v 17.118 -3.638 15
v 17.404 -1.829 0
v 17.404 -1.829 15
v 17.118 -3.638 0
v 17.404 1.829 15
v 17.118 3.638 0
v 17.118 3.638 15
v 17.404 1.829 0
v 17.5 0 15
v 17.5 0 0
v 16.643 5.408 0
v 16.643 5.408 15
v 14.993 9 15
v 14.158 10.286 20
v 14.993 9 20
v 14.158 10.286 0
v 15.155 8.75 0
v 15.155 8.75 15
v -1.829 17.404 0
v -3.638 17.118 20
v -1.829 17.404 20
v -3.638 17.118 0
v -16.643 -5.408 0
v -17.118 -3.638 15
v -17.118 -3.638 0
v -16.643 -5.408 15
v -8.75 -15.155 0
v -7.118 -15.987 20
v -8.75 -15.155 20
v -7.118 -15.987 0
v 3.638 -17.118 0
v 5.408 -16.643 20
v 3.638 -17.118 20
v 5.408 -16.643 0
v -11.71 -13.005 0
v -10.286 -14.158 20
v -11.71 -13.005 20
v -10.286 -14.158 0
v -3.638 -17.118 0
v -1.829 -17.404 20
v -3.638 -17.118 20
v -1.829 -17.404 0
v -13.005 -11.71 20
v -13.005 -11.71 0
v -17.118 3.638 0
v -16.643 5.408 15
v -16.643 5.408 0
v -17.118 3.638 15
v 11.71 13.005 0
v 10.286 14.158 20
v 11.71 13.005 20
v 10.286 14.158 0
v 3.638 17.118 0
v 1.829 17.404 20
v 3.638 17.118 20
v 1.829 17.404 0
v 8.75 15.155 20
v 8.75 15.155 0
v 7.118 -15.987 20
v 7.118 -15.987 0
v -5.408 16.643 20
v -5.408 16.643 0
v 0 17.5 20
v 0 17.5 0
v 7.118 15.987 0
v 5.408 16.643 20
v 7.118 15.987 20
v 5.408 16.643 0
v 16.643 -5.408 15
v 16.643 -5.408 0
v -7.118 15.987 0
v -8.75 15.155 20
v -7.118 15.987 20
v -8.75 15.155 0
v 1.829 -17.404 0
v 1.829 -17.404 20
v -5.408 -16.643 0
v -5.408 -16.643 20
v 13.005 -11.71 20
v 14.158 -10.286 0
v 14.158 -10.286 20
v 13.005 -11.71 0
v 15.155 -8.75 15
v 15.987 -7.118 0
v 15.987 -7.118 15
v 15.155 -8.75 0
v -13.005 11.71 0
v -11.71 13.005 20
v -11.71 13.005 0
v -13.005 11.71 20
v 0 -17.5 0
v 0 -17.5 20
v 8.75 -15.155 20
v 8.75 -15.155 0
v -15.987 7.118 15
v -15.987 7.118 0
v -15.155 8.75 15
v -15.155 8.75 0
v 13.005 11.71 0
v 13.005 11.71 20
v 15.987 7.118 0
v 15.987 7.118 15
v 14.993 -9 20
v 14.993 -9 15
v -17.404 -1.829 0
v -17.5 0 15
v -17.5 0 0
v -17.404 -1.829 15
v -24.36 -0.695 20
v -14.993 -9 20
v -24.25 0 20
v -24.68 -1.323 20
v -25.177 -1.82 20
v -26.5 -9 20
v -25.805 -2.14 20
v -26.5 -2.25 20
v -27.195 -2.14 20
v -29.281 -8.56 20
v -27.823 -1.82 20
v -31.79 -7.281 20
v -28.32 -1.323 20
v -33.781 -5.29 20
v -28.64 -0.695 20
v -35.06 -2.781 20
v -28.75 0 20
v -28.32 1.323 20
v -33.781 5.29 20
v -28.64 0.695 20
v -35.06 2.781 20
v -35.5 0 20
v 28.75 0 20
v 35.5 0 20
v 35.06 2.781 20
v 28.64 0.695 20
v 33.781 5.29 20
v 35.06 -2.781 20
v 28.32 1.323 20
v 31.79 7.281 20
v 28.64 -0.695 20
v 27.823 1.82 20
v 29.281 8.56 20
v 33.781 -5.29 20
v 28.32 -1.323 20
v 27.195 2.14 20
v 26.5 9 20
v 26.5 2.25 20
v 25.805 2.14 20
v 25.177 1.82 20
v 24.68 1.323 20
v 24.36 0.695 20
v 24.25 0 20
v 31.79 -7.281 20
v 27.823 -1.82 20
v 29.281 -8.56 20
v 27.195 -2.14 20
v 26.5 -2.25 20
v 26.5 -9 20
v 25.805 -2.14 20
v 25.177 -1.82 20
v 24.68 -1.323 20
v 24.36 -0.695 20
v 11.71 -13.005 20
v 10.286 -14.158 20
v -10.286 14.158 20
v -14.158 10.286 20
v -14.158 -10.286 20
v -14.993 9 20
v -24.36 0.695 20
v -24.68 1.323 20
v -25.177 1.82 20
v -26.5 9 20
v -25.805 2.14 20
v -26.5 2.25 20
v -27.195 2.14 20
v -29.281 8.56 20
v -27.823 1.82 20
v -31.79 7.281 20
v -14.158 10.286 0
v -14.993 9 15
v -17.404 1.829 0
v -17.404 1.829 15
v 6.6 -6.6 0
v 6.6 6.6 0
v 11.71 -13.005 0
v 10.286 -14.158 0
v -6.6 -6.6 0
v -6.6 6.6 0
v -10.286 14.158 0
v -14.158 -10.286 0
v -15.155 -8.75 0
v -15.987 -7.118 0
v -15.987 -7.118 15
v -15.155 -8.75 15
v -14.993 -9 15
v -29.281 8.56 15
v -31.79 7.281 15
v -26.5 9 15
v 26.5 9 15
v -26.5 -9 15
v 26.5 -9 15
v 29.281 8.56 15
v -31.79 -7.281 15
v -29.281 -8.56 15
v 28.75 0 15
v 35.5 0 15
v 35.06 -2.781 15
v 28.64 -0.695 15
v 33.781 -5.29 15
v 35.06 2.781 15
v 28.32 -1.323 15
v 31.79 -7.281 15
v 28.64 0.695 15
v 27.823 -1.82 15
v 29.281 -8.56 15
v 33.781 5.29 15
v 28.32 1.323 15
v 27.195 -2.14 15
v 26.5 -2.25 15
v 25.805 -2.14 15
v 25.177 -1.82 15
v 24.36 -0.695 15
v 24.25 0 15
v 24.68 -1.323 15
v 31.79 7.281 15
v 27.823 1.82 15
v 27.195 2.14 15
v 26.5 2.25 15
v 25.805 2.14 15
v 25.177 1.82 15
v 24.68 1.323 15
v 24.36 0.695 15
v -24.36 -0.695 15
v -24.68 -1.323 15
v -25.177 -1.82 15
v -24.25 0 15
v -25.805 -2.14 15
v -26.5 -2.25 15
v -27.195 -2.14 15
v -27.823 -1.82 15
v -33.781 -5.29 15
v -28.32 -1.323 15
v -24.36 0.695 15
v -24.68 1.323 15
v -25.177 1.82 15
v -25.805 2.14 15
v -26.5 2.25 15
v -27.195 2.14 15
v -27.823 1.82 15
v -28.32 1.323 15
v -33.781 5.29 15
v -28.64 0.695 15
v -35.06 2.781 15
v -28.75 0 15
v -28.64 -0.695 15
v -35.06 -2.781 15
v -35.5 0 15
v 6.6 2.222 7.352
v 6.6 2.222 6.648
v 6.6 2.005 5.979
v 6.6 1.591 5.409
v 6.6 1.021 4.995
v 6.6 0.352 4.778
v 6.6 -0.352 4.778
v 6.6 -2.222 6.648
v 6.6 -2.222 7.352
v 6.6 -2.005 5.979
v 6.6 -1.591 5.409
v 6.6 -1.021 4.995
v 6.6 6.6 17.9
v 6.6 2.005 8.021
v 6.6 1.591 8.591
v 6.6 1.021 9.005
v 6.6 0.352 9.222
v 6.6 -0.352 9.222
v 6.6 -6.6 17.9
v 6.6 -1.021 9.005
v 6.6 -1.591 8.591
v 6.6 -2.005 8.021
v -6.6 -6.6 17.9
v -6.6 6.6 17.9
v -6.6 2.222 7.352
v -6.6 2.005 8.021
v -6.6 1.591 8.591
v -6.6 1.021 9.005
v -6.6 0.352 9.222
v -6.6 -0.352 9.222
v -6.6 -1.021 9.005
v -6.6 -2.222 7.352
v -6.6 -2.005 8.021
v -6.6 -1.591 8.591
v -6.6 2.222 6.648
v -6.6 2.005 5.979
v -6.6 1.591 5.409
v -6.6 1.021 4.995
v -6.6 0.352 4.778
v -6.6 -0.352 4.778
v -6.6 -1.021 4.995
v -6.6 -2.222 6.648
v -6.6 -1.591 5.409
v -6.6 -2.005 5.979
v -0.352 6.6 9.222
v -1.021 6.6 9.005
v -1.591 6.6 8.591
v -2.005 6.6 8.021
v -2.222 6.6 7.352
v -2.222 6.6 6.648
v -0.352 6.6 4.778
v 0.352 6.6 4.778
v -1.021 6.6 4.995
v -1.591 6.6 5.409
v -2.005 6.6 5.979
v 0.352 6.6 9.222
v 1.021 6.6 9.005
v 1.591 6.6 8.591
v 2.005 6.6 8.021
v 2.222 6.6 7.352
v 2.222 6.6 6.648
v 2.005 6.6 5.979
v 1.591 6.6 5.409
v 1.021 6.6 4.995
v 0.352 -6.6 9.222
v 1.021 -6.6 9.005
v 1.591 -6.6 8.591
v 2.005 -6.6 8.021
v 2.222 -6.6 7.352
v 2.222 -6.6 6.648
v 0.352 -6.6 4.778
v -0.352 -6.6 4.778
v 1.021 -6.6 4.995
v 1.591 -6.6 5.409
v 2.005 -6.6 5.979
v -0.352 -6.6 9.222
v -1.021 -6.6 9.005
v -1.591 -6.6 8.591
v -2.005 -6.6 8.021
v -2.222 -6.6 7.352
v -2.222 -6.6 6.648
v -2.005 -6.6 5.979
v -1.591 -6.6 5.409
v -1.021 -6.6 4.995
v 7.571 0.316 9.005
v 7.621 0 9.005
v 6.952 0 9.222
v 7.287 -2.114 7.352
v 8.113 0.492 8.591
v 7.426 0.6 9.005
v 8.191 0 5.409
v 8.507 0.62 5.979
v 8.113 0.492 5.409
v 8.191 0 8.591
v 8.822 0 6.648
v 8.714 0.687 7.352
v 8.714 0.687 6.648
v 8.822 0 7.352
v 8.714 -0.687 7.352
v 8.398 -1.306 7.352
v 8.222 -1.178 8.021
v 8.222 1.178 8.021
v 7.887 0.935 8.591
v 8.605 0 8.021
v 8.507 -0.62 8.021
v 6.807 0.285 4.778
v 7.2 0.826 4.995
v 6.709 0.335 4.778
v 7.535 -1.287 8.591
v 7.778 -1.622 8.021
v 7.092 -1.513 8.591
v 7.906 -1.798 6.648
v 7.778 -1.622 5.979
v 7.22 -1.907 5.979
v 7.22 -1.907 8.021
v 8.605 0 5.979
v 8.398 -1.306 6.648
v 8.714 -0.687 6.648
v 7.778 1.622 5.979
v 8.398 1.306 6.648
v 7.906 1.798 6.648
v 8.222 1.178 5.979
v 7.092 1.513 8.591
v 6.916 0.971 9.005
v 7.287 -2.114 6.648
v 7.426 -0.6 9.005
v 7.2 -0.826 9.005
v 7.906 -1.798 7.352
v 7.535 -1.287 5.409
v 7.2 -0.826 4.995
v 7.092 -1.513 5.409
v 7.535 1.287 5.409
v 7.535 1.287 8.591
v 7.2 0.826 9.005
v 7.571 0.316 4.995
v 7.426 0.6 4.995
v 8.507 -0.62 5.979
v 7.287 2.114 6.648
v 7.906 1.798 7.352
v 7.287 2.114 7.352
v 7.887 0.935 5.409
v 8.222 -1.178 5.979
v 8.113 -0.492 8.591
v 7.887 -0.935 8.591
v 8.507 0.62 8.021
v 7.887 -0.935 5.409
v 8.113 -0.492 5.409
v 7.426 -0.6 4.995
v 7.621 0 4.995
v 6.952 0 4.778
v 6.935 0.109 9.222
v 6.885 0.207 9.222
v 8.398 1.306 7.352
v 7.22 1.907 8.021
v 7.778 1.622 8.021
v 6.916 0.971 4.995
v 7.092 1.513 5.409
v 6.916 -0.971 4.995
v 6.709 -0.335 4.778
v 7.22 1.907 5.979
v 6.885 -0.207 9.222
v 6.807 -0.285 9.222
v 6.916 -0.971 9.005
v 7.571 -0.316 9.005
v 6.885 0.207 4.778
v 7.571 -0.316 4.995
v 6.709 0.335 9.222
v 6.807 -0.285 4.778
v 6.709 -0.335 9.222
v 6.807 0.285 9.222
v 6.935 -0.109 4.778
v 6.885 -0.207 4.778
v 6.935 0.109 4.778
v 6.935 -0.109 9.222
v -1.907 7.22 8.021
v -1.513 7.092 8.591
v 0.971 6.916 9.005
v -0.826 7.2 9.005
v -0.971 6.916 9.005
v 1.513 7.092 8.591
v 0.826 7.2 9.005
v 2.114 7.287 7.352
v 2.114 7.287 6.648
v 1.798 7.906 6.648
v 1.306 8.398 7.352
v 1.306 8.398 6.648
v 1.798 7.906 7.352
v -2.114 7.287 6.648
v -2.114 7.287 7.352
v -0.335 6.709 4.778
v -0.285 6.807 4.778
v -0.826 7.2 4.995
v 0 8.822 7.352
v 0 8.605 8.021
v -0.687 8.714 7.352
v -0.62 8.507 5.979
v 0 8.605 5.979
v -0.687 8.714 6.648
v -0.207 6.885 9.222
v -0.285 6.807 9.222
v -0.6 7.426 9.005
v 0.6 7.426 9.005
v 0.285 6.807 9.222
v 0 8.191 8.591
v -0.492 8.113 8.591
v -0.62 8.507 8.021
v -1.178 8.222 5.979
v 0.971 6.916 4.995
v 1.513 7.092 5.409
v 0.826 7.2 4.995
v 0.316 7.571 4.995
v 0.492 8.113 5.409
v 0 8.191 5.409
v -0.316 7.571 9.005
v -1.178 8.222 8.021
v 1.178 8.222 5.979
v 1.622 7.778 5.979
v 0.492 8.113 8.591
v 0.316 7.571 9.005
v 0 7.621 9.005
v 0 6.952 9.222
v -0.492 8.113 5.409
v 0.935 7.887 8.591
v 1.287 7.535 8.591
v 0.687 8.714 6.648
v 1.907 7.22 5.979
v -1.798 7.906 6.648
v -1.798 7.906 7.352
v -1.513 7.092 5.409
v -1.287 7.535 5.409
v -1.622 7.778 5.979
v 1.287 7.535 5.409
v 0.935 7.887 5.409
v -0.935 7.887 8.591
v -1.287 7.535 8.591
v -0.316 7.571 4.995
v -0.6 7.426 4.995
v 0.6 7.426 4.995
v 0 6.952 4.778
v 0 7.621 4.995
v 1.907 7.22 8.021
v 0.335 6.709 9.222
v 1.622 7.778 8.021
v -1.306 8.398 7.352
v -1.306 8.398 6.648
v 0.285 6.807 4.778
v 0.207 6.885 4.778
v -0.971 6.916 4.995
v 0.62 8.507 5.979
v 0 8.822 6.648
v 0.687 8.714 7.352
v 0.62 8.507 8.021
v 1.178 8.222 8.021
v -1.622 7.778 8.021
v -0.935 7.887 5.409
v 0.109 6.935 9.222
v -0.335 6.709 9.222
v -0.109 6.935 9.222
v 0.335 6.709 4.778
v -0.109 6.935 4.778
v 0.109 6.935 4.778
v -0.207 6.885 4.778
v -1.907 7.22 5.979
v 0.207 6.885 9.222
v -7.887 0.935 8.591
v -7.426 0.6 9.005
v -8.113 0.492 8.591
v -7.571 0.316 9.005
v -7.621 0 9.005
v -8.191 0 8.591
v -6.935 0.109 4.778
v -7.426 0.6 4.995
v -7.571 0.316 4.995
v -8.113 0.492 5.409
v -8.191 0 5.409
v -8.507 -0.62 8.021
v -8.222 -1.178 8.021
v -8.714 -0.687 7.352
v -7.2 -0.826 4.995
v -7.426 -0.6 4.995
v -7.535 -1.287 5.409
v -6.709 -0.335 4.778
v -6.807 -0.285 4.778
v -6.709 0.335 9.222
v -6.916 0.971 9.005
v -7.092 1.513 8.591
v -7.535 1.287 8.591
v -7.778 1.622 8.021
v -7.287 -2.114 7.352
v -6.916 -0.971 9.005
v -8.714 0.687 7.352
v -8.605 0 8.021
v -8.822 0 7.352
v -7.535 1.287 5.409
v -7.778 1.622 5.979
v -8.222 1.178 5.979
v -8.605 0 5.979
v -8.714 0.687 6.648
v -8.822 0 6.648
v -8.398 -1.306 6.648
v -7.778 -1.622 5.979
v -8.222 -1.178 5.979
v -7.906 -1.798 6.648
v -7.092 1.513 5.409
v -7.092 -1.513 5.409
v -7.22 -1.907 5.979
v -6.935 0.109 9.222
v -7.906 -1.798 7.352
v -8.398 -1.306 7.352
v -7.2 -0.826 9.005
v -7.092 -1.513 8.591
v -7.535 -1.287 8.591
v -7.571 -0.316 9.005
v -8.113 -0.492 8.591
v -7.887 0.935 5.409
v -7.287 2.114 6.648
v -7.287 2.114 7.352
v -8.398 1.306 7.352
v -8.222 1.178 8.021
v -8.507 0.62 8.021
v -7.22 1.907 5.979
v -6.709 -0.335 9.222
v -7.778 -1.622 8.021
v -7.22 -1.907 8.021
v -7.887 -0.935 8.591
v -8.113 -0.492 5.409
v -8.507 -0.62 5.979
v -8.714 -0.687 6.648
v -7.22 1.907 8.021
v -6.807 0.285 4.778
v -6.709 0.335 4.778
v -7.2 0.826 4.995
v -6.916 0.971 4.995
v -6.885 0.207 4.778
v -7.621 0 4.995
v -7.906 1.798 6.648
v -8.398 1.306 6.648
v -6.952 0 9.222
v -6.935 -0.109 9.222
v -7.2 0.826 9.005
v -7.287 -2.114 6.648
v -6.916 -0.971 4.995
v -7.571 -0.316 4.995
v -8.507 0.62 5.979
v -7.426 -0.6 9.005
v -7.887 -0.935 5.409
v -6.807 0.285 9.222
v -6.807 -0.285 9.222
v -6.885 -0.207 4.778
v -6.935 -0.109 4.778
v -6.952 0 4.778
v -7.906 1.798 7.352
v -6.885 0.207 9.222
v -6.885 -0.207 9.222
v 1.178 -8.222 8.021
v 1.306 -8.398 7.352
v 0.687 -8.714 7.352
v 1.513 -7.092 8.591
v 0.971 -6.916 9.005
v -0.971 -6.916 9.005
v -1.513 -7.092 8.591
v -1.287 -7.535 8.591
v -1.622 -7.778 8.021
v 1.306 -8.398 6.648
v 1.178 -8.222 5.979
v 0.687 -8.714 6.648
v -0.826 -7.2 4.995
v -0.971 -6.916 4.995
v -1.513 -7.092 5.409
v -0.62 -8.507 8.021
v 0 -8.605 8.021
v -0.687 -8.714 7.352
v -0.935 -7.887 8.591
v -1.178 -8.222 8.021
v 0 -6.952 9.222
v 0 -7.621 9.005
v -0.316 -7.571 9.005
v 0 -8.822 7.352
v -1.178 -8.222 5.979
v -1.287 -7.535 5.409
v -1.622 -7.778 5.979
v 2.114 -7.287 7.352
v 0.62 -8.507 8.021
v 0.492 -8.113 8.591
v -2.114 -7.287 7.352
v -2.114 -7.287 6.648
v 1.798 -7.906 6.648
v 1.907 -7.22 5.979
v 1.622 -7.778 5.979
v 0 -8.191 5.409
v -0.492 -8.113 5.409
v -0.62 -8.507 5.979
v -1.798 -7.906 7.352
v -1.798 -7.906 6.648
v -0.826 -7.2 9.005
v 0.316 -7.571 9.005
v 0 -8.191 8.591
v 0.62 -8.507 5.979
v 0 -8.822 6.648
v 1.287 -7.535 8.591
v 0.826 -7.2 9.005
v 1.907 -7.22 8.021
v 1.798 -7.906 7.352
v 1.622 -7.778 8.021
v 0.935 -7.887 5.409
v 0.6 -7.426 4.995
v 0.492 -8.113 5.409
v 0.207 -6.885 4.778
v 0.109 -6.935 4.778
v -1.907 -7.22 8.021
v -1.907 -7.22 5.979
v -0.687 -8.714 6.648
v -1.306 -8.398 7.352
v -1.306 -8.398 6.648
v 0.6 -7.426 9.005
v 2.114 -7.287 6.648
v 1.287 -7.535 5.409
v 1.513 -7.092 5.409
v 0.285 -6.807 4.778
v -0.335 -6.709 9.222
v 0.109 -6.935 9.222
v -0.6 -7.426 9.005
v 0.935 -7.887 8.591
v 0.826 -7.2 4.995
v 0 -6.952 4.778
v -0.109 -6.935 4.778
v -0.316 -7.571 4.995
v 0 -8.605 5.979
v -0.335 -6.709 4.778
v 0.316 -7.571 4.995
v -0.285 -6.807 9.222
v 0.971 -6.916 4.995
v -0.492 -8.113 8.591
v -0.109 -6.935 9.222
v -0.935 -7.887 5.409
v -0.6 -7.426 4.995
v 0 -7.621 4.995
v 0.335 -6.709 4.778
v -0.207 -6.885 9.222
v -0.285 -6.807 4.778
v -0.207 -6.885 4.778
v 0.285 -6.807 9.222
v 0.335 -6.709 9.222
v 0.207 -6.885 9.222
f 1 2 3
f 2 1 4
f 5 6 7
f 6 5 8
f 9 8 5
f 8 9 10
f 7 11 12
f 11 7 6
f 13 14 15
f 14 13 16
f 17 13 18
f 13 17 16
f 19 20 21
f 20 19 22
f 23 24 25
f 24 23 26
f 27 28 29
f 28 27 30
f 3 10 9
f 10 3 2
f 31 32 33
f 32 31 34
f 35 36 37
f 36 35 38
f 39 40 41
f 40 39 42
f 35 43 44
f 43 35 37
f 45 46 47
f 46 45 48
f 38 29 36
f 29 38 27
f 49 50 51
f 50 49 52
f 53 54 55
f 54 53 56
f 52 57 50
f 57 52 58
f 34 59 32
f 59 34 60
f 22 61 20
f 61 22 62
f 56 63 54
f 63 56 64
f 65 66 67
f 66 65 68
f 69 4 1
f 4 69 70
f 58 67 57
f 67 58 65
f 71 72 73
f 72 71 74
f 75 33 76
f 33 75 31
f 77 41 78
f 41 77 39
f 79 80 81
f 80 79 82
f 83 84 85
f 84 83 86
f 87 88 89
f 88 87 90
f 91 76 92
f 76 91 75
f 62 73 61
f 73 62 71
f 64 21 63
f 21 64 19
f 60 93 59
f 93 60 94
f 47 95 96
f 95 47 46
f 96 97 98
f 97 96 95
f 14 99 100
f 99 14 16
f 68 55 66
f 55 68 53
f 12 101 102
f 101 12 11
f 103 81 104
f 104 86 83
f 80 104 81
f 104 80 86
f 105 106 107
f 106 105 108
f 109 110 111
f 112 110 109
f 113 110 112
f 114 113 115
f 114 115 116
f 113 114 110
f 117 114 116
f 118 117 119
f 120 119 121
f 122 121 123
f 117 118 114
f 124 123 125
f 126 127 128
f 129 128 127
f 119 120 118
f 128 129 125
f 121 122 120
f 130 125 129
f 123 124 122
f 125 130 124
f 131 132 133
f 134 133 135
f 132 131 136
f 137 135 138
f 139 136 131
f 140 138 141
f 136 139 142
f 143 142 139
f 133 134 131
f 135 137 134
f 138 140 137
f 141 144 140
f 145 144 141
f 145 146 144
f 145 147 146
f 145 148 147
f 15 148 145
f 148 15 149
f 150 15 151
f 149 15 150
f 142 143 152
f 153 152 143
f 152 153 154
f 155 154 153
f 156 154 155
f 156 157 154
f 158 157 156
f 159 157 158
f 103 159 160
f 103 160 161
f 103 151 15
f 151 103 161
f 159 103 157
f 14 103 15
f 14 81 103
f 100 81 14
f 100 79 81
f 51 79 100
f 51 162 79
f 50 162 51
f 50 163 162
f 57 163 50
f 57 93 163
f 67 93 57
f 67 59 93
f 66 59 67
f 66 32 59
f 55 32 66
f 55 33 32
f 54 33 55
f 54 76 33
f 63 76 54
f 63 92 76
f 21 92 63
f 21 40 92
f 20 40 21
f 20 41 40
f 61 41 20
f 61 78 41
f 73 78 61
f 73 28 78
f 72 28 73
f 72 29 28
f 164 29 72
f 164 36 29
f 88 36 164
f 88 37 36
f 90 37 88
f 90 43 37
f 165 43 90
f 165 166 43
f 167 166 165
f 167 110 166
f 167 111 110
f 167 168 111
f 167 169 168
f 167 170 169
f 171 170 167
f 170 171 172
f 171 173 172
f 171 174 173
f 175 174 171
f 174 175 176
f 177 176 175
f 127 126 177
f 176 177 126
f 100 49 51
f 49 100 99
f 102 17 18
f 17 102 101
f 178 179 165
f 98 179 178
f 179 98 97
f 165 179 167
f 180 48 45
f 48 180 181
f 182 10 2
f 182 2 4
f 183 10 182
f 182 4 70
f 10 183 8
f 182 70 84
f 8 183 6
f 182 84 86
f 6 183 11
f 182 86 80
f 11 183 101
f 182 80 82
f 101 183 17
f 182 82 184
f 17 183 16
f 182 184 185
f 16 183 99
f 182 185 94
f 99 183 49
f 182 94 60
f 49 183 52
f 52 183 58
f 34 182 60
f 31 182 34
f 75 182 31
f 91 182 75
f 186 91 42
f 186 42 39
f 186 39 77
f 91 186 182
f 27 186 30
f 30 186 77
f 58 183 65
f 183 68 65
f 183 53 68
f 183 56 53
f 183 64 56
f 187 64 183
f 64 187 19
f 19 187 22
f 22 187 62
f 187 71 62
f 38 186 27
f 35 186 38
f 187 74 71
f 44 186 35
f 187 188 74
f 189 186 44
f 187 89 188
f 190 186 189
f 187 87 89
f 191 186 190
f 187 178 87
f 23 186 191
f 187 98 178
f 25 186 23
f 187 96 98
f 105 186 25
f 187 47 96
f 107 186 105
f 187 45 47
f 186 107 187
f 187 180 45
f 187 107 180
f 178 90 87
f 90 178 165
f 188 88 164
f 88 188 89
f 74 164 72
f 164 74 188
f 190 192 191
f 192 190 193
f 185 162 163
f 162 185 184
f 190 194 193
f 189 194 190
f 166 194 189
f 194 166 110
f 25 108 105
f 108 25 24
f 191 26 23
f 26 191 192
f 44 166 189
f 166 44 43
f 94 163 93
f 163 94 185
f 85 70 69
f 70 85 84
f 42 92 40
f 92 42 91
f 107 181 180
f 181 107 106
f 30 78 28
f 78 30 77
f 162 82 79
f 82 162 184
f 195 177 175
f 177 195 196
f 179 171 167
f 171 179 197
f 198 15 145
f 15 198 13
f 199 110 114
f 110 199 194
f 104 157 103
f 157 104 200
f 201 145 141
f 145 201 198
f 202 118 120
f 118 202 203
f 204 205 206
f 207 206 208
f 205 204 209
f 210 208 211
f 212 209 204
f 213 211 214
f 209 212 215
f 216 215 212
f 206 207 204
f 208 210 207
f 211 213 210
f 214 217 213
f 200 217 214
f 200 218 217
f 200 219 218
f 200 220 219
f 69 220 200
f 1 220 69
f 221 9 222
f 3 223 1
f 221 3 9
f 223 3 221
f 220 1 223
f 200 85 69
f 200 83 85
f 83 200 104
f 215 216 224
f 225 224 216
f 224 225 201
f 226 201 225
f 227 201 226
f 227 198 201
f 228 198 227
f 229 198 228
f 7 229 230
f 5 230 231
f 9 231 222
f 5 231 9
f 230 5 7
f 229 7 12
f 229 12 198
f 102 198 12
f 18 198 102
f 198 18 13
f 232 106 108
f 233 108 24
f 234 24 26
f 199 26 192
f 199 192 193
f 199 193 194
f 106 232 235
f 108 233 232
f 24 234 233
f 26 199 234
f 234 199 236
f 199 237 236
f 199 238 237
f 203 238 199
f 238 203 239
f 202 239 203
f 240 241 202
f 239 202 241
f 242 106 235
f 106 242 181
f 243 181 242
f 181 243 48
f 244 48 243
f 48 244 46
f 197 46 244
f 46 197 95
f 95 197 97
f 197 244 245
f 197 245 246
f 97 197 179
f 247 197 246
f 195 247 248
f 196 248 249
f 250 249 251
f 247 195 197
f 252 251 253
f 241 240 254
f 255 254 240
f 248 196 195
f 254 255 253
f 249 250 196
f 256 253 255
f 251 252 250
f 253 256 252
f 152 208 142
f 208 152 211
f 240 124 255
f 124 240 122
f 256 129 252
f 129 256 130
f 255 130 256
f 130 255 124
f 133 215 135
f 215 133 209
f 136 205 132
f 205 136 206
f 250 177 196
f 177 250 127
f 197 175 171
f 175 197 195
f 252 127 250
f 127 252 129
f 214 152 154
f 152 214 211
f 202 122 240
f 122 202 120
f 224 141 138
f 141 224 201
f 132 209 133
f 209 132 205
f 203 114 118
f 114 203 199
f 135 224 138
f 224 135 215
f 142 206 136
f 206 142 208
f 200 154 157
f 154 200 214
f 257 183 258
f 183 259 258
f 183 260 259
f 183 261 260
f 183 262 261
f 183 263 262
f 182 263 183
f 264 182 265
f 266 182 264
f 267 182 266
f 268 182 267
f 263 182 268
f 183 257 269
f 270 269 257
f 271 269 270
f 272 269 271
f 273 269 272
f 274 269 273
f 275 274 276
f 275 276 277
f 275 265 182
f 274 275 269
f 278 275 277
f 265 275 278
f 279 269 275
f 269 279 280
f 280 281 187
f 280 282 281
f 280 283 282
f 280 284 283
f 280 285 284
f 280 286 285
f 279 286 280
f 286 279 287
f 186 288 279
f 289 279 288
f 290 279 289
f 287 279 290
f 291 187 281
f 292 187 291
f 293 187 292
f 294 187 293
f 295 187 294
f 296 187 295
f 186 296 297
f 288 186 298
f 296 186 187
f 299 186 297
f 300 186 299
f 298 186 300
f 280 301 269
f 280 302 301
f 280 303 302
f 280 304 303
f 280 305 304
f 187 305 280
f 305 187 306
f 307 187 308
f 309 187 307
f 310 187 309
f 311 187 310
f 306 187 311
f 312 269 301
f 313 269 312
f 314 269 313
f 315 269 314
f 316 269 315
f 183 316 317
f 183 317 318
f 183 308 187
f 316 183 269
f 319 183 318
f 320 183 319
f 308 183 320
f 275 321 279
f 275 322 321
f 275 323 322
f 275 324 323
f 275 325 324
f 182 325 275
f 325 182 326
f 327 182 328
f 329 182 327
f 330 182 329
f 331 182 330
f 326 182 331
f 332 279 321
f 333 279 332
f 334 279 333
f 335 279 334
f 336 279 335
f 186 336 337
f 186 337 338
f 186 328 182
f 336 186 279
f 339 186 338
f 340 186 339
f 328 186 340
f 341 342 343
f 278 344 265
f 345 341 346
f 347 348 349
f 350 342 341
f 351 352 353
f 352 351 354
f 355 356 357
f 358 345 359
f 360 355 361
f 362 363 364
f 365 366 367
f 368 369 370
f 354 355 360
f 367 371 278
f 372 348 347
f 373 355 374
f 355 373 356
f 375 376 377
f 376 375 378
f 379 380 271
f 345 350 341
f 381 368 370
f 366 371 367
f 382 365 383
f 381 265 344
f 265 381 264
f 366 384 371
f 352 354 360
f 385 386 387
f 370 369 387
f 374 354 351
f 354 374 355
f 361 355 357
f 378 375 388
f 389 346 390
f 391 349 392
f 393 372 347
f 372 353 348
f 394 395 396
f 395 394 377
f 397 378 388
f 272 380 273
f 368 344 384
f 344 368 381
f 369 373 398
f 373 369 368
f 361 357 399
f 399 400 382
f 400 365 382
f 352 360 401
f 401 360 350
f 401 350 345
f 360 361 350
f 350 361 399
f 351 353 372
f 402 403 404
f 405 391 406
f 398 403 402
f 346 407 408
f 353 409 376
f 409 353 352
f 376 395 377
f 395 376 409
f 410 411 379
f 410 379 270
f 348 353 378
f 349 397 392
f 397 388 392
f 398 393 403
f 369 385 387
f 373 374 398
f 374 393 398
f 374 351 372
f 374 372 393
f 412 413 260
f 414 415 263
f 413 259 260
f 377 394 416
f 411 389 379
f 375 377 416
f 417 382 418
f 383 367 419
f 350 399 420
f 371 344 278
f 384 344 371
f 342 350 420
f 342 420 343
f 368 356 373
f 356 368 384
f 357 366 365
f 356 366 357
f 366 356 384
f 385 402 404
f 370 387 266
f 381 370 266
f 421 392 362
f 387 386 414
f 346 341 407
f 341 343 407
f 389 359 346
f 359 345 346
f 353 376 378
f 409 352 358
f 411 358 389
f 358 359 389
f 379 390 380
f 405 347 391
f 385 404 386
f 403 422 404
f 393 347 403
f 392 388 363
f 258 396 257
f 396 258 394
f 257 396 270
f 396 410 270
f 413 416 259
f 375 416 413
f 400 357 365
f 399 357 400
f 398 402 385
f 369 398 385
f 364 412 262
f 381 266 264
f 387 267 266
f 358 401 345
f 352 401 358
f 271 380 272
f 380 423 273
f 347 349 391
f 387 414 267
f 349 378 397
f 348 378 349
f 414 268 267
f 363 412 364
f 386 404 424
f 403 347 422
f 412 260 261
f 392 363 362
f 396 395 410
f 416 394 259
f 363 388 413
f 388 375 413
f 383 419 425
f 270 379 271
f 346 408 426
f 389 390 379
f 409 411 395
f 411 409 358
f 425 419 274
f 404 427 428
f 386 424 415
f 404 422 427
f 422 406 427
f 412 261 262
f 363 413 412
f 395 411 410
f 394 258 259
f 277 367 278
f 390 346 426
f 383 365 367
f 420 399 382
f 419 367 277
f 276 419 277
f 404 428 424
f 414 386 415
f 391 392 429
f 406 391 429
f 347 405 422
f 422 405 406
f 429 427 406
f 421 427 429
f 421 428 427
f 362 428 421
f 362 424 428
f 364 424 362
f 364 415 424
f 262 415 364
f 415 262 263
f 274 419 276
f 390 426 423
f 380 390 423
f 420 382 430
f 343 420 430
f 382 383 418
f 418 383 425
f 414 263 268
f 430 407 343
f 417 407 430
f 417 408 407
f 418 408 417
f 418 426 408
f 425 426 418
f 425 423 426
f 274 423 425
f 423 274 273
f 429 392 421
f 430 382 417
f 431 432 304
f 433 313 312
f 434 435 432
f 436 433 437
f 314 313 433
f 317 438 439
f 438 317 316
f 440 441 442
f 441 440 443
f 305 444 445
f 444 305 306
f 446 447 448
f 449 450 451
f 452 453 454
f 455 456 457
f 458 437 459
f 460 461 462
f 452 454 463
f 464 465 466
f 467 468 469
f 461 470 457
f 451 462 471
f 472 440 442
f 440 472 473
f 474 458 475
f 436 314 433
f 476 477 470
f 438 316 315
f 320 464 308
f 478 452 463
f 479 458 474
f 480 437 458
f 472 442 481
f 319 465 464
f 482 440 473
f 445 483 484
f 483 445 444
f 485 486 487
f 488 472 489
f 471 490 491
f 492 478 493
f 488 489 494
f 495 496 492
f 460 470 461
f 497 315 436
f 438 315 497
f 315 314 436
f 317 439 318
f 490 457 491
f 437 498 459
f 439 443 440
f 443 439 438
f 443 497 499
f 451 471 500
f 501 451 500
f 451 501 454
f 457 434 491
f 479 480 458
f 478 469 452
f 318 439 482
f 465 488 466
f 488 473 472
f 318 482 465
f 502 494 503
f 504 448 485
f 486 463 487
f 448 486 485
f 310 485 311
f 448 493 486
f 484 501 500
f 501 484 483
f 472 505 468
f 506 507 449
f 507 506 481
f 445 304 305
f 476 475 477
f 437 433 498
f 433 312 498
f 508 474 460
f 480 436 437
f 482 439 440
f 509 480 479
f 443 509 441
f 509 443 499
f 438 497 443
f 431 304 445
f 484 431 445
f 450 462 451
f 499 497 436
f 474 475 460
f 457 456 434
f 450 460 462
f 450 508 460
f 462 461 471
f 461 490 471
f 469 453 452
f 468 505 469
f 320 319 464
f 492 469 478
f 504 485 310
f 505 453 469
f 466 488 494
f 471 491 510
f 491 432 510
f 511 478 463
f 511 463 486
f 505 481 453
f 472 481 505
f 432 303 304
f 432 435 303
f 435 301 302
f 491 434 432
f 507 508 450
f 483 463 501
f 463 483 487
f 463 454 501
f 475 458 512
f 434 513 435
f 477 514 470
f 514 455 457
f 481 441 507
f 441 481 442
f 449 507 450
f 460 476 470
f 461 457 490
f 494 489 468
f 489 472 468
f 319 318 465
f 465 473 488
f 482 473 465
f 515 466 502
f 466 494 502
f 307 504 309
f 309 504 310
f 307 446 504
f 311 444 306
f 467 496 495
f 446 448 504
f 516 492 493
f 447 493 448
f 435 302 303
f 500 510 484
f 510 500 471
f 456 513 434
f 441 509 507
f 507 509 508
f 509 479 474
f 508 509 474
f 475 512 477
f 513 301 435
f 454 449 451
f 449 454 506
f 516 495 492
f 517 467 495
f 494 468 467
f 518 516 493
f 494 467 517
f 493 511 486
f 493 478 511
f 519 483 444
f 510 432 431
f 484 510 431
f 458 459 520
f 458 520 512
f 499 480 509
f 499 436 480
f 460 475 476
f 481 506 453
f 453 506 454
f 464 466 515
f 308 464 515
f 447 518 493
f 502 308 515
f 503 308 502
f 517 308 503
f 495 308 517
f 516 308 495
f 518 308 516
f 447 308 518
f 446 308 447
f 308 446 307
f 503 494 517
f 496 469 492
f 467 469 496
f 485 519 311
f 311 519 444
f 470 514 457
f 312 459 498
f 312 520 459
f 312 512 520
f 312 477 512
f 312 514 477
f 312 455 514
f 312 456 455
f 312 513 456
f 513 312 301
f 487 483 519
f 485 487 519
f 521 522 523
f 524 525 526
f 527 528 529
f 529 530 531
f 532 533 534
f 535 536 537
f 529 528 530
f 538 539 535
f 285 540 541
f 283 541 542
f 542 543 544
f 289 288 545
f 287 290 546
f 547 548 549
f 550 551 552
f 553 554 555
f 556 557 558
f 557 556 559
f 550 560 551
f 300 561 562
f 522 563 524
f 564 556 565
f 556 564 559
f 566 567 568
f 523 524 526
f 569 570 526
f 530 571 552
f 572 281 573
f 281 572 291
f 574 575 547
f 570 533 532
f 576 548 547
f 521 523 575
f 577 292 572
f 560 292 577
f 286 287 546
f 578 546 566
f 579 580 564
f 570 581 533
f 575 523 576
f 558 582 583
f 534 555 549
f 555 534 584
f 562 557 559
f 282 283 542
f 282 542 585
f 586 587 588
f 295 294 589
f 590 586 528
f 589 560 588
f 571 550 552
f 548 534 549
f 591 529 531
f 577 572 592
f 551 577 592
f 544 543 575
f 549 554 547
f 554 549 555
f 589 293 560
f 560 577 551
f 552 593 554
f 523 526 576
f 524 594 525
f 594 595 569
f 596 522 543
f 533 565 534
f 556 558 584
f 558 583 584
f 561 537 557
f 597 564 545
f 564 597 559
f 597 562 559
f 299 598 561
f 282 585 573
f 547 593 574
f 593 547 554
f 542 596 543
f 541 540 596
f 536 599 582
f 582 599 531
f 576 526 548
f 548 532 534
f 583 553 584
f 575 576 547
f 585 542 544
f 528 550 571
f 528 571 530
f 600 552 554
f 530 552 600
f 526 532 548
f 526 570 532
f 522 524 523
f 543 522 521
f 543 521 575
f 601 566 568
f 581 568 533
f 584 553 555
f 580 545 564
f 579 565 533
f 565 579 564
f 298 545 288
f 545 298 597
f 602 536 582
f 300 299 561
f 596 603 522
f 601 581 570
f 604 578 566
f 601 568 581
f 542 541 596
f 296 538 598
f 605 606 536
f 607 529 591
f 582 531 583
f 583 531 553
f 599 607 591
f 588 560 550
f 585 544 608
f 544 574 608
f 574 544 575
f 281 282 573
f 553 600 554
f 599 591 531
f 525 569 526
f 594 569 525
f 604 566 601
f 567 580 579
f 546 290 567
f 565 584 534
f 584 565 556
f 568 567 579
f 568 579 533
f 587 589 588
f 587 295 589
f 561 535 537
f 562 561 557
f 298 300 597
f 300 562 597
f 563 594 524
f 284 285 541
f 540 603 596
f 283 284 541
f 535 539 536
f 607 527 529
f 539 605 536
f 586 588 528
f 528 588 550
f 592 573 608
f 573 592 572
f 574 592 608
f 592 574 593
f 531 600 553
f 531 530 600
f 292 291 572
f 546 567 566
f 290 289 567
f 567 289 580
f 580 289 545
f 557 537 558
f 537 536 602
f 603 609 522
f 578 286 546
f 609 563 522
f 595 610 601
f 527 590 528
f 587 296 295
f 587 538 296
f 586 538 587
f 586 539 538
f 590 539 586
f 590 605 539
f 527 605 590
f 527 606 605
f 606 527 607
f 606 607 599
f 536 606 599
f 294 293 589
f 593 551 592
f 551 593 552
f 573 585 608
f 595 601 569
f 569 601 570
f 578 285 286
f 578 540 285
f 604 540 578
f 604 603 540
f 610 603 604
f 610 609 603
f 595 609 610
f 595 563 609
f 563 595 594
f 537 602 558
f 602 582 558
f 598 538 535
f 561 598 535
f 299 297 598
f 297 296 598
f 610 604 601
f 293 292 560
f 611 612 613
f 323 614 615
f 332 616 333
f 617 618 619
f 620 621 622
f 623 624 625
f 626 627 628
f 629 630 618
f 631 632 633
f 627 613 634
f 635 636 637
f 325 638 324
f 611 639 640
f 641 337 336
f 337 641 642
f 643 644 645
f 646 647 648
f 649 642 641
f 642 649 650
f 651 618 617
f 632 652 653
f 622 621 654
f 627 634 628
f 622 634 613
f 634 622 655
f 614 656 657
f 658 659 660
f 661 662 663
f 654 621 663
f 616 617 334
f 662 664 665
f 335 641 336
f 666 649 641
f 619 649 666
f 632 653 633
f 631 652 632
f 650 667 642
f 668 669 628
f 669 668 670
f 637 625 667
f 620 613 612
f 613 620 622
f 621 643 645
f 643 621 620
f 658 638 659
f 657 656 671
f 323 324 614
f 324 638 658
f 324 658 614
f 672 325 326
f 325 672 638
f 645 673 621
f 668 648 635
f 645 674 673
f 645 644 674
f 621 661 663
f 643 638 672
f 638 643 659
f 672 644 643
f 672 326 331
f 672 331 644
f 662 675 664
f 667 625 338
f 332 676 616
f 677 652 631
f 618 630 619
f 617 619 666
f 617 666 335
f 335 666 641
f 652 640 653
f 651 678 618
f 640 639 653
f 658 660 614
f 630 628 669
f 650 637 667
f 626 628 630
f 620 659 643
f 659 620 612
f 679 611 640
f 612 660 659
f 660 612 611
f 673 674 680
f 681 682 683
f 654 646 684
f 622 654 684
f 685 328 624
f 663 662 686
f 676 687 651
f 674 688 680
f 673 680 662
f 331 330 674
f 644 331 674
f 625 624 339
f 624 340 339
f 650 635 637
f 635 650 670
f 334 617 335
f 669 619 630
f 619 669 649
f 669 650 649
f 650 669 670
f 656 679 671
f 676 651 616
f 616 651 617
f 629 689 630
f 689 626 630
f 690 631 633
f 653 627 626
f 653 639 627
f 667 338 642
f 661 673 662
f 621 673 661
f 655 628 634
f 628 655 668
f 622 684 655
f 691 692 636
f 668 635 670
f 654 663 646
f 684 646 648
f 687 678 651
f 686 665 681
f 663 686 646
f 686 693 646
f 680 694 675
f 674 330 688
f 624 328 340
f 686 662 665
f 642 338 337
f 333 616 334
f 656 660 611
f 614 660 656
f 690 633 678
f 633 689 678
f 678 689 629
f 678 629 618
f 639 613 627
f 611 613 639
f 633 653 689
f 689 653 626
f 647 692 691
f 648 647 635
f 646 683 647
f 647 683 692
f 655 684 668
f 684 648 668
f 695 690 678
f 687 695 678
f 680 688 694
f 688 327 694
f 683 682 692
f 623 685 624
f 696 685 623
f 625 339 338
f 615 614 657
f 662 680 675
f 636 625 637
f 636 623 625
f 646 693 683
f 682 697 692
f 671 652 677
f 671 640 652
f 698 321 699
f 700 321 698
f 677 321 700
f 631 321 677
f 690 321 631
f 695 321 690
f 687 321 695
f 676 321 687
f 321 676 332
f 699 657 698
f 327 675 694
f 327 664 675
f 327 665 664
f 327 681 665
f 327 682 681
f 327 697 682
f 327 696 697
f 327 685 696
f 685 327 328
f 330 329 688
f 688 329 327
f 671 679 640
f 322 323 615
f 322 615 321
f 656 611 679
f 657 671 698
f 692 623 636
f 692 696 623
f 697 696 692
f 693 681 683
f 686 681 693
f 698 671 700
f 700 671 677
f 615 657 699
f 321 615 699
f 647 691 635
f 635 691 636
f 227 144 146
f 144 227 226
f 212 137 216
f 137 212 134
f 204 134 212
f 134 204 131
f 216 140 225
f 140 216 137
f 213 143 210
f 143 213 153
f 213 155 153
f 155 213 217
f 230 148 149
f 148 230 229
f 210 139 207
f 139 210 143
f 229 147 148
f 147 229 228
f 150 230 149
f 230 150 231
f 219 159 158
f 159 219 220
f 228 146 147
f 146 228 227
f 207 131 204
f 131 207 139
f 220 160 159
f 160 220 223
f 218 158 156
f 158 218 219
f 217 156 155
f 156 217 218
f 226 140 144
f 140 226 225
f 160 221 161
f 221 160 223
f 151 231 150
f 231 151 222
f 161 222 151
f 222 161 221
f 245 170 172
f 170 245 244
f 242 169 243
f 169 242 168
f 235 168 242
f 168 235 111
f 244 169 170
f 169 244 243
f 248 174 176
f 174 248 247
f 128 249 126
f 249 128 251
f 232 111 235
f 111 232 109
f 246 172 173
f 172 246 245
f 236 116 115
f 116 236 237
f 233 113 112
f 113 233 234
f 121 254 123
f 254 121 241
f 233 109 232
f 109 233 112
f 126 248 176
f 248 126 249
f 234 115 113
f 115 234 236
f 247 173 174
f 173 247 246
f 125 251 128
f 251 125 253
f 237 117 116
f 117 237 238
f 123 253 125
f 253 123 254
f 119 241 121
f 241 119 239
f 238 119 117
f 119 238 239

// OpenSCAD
driveWidth = 13.2;
driveDepth = 18;
socketDiamater = 35;
socketHeight = 20;
driveBearingDepth = 7;
driveBearingDiameter = 4.5;
mountDiamater = 18;
mountHeight = 5;
mountHoleDiamater = 4.5;

$fn = 20;

difference(){
    union(){
        cylinder(d=socketDiamater, h=socketHeight, $fn=60);
        hull(){
            translate([socketDiamater/2+mountDiamater/2,0,socketHeight-mountHeight])
                cylinder(d=mountDiamater, h=mountHeight);
            translate([-socketDiamater/2-mountDiamater/2,0,socketHeight-mountHeight])
                cylinder(d=mountDiamater, h=mountHeight);
        }
    }
    translate([-driveWidth/2,-driveWidth/2,-.1]) cube([driveWidth,driveWidth,driveDepth]);
    translate([driveWidth/2,0,driveBearingDepth]) sphere(d=driveBearingDiameter);
    translate([0,driveWidth/2,driveBearingDepth]) sphere(d=driveBearingDiameter);
    translate([-driveWidth/2,0,driveBearingDepth]) sphere(d=driveBearingDiameter);
    translate([0,-driveWidth/2,driveBearingDepth]) sphere(d=driveBearingDiameter);
    translate([socketDiamater/2+mountDiamater/2,0,socketHeight-mountHeight]) 
        cylinder(d=mountHoleDiamater, h=mountHeight);
    translate([-socketDiamater/2-mountDiamater/2,0,socketHeight-mountHeight])
        cylinder(d=mountHoleDiamater, h=mountHeight);
}

module screwHole(){
    screwHole = 3;
    screwDepth = 10;
    screwHead = 8.2;
    headTaper = 2.3;
    translate([0,0,-headTaper])cylinder(d1=screwHole, d2=screwHead, h = headTaper, $fn=20);
    translate([0,0,-headTaper-screwDepth])cylinder(d=screwHole, h=screwDepth, $fn=10);
}
